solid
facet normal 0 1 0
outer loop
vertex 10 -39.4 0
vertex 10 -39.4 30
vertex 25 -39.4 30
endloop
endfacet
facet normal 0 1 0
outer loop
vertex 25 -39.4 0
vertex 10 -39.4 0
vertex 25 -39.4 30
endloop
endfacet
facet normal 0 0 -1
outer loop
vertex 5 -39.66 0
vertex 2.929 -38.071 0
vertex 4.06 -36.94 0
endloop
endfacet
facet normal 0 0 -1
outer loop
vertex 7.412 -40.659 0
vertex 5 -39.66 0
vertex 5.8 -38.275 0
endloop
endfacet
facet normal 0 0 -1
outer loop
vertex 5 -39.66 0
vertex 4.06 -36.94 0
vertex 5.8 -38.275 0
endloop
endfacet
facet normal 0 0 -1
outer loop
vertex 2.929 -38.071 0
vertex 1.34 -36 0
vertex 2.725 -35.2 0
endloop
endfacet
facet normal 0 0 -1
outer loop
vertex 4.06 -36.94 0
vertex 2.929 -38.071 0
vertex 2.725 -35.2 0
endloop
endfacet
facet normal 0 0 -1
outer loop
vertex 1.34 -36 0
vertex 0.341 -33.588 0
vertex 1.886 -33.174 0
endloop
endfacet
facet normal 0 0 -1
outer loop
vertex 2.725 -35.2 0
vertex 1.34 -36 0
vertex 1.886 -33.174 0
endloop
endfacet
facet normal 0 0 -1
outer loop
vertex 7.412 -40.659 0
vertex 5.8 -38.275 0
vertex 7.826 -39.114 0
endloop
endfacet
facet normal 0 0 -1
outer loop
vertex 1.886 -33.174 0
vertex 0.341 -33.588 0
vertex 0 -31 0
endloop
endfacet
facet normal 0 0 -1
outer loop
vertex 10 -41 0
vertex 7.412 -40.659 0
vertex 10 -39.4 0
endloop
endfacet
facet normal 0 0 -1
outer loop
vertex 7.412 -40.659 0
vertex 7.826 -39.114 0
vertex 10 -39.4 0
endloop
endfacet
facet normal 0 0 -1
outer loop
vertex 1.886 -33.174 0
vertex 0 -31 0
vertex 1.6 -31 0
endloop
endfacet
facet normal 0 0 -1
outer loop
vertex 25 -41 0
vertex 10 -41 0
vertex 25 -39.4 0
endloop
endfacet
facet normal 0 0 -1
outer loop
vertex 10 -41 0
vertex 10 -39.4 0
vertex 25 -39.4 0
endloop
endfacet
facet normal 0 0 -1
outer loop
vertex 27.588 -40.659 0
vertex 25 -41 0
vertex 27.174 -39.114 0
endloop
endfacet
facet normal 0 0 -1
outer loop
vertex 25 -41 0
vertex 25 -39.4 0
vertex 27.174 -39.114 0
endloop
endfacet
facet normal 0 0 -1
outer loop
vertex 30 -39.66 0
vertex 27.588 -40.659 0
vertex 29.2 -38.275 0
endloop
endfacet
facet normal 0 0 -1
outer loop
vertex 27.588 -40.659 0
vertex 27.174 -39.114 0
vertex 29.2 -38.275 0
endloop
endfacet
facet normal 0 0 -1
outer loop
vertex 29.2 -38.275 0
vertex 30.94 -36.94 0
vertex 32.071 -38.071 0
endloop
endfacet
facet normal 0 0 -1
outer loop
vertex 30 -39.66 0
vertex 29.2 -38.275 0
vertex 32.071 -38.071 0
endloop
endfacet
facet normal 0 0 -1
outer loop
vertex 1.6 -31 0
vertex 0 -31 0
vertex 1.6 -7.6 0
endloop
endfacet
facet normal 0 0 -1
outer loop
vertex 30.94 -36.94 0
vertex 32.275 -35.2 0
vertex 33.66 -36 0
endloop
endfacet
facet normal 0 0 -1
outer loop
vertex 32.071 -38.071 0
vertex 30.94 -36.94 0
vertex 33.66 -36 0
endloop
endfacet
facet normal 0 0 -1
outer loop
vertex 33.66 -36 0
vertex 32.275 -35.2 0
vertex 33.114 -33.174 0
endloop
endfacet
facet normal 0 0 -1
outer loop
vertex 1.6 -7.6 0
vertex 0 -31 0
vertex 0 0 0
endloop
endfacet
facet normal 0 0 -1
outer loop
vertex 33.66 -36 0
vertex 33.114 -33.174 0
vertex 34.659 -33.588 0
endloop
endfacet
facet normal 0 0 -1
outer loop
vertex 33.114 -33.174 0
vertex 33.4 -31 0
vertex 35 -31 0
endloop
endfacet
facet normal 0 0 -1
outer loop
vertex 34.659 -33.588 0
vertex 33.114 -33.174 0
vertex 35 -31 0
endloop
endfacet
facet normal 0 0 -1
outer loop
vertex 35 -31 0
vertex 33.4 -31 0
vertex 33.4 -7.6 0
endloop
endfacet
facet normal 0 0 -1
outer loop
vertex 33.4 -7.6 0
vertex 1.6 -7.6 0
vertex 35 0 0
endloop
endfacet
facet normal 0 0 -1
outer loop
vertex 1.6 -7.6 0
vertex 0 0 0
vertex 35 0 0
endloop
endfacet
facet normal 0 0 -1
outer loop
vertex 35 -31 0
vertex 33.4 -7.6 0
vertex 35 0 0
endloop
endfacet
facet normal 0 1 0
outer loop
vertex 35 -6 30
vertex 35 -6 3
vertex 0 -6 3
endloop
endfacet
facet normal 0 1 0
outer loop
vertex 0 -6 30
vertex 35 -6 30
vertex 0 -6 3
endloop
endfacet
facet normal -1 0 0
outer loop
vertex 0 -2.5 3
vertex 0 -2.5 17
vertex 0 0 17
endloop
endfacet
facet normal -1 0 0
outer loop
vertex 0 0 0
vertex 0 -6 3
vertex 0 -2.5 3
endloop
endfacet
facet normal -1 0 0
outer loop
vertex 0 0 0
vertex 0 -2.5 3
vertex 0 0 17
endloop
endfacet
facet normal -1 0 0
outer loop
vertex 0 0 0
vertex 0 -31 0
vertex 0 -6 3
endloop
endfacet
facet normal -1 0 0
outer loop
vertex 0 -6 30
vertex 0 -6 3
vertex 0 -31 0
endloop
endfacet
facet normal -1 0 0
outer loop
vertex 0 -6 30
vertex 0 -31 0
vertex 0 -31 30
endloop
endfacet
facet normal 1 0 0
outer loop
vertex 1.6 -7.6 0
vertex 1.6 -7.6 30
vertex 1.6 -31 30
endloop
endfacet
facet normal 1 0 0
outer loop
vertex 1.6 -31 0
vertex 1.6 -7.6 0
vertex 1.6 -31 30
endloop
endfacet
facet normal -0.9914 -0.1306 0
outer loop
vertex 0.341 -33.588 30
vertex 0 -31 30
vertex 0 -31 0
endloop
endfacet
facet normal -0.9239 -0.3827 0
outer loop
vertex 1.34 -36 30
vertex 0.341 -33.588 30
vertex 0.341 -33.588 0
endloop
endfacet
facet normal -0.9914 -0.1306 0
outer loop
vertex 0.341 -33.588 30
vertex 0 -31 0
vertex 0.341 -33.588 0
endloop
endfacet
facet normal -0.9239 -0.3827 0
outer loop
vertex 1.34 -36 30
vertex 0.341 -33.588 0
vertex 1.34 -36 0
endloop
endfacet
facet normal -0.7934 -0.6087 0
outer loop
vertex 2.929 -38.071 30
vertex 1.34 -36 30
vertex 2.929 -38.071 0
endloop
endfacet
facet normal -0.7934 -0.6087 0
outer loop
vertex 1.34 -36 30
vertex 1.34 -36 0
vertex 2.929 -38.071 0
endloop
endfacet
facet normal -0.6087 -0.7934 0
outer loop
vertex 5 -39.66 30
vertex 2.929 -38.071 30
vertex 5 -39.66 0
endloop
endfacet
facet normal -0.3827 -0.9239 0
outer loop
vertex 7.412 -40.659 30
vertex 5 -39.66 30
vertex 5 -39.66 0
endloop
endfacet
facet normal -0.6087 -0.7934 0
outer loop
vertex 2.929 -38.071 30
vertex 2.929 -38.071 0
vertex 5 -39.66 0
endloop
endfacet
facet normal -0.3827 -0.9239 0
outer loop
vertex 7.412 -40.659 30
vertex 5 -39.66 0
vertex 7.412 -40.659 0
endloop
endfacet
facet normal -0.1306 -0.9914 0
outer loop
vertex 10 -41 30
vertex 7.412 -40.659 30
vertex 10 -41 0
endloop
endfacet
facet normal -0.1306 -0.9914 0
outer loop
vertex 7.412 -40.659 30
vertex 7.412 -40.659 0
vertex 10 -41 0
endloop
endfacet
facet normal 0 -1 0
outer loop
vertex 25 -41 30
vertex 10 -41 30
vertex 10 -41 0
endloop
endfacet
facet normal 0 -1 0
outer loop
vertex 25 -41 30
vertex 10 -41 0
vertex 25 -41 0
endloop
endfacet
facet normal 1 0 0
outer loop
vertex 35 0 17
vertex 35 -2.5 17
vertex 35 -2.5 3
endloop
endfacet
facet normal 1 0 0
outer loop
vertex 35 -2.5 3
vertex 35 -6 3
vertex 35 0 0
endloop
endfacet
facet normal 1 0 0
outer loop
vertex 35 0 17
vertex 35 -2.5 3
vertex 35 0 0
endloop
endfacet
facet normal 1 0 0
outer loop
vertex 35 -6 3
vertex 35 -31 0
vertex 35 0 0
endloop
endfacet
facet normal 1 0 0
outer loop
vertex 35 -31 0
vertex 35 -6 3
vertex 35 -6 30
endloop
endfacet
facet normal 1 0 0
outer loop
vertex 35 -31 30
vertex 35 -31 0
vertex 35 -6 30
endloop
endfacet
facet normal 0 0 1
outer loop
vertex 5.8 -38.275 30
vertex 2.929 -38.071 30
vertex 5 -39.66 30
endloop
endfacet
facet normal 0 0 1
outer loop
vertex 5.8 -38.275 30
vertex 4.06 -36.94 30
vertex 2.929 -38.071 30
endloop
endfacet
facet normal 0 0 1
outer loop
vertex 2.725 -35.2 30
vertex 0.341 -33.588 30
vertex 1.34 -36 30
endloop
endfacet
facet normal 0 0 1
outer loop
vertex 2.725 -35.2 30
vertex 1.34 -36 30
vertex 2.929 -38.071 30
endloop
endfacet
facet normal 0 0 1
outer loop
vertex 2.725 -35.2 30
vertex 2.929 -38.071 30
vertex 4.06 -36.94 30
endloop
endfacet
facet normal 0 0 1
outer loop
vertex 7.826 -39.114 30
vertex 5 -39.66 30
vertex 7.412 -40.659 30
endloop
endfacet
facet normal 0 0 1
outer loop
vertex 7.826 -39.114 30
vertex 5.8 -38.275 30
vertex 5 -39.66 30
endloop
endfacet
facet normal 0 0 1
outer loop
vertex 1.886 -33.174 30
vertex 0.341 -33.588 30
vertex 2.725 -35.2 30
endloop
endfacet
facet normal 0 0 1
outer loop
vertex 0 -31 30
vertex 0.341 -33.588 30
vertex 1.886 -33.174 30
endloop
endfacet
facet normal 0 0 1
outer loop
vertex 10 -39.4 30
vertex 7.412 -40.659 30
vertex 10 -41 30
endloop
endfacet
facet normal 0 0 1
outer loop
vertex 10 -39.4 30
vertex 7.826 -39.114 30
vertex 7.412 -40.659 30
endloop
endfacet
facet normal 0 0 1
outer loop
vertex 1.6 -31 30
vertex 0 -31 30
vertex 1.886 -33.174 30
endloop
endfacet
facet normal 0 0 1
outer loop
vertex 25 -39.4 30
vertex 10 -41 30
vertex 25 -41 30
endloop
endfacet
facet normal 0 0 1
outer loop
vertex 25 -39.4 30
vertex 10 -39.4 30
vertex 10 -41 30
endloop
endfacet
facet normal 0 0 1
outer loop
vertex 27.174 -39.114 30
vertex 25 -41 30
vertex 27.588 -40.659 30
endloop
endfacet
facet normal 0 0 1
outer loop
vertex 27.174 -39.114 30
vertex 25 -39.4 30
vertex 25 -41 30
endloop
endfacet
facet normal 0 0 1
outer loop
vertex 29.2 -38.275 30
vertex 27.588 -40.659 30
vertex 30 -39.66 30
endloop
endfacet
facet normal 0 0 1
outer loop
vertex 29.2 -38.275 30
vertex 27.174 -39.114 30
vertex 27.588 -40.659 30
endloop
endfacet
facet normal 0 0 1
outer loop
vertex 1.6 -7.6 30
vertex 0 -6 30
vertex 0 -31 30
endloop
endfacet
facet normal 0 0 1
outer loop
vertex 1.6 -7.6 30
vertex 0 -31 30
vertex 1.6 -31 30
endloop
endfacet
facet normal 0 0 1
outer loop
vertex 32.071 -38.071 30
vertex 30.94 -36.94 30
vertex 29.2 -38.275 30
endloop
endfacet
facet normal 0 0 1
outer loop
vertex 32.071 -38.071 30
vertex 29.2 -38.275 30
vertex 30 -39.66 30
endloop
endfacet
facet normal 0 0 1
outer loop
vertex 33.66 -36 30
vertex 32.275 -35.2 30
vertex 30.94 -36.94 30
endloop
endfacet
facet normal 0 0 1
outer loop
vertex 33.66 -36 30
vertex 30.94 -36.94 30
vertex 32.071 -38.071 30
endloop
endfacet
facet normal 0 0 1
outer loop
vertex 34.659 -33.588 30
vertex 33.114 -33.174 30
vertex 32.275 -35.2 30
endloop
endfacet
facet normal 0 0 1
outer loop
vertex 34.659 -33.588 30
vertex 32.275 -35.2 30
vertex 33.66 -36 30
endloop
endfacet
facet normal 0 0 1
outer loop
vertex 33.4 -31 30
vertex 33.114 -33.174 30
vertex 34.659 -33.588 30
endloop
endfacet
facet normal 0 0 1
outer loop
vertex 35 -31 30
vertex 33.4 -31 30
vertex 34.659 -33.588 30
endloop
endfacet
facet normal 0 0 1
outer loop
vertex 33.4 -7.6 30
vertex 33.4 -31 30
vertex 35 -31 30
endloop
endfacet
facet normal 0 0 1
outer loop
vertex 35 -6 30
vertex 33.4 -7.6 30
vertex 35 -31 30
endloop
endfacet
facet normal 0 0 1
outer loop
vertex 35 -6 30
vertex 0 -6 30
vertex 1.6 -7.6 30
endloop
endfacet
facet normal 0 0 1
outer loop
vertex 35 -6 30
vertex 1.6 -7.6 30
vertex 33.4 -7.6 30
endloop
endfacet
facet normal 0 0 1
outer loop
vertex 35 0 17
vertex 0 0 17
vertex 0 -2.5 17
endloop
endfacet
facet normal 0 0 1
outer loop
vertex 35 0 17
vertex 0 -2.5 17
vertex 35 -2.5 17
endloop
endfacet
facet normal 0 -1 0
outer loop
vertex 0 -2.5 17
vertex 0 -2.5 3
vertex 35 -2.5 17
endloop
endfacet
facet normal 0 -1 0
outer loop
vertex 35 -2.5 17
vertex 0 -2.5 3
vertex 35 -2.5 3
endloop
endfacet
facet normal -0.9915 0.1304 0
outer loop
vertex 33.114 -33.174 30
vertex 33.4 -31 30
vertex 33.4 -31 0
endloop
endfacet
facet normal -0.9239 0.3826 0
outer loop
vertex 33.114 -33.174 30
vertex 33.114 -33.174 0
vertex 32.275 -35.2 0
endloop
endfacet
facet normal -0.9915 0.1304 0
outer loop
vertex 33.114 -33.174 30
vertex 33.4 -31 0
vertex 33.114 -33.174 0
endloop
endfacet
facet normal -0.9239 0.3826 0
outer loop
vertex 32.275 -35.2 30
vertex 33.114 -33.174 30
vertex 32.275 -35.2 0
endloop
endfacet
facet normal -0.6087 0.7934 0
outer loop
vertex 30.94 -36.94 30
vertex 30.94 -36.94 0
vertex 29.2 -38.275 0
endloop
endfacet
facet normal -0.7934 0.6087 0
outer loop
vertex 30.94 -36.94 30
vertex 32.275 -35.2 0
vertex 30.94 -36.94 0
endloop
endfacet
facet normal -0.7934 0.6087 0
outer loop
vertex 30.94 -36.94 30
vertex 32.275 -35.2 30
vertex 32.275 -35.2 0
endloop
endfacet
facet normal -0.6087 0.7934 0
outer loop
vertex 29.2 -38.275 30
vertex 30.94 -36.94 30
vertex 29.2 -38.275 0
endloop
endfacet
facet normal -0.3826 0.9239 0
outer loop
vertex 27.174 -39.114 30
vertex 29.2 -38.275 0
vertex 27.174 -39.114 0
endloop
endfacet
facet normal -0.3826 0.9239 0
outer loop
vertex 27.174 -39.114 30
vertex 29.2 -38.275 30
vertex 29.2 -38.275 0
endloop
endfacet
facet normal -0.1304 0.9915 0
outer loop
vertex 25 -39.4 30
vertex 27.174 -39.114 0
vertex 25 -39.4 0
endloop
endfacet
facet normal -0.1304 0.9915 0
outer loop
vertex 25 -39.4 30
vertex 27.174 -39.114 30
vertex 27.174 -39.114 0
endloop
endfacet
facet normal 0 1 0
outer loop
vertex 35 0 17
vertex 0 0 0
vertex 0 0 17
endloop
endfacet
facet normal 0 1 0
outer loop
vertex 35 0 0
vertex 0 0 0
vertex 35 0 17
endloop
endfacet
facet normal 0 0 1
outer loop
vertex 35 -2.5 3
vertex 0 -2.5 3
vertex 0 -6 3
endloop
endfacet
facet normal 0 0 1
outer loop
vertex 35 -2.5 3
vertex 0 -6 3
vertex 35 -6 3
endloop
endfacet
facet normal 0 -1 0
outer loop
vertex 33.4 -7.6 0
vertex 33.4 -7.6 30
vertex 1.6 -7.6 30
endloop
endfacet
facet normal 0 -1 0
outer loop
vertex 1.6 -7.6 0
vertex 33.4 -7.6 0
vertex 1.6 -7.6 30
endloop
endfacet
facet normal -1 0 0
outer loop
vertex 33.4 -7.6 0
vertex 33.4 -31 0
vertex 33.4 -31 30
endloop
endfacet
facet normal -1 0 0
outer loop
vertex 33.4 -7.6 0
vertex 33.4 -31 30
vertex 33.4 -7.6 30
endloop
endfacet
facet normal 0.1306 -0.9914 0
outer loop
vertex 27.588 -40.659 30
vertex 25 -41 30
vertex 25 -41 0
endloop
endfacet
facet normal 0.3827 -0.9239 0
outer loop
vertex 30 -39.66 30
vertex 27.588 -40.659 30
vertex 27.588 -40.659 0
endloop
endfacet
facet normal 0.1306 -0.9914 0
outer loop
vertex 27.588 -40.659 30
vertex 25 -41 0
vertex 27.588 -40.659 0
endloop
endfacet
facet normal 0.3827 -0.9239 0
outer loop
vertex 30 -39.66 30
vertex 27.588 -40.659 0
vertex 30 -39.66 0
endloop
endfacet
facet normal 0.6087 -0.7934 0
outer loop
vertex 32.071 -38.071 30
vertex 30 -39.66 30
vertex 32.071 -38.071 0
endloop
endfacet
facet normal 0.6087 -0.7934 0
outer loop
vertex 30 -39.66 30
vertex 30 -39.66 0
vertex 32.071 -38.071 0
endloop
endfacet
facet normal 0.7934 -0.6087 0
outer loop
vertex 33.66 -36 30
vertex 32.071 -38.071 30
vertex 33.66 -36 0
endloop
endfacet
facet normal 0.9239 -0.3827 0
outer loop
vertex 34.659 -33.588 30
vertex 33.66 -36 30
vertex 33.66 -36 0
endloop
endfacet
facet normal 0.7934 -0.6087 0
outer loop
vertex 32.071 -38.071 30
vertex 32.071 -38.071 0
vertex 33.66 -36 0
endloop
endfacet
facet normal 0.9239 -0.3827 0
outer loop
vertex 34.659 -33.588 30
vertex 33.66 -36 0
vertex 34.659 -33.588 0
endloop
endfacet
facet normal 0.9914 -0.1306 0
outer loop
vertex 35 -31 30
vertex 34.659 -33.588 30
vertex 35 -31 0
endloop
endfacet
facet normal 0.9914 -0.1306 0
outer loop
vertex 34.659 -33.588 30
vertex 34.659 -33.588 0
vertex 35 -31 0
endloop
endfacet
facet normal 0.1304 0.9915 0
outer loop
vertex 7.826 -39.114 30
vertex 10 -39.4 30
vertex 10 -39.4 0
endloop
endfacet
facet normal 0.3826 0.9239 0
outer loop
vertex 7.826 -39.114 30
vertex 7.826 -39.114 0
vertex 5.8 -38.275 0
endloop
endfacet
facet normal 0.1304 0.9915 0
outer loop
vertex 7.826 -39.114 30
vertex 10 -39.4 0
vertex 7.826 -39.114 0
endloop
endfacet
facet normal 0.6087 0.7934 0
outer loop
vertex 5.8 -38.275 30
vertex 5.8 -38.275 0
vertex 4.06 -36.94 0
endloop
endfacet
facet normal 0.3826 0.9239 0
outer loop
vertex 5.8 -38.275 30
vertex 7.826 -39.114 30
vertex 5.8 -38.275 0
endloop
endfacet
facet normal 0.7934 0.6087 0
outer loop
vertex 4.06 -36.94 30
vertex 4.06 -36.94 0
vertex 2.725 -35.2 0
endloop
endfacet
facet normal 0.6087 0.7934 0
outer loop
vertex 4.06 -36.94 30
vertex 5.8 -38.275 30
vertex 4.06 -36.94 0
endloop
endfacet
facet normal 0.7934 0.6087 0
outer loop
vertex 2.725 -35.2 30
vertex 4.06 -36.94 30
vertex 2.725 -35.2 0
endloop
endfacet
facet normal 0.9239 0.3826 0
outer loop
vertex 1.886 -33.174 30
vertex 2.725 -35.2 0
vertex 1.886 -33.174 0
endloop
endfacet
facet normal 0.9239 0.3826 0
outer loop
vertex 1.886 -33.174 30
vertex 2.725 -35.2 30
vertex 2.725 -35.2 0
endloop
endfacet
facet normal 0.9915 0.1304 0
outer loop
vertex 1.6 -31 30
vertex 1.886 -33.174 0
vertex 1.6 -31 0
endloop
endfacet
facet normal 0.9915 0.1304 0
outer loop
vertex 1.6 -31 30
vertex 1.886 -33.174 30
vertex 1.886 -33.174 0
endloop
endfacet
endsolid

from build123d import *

# Parameters (mm, degrees)
F1_DEPTH = 30
F2_T     = -1.6
F0_W     = 35
F0_H     = 3.5
F3_DEPTH = 3
F0_H_2   = 2.5
F4_DEPTH = 17
F5_DEPTH = 5


with BuildPart() as f1:
    # F0 (on Top) → F1 (new body)
    with BuildSketch(Plane.XY):
        with BuildLine():
            Line((35, -6), (0, -6))
            Line((0, -6), (0, -31))
            ThreePointArc((0, -31), (2.9289321881, -38.0710678119), (10, -41))
            Line((10, -41), (25, -41))
            ThreePointArc((25, -41), (32.0710678119, -38.0710678119), (35, -31))
            Line((35, -31), (35, -6))
        make_face()
    extrude(amount=F1_DEPTH)

    # F2
    f2_openings = [f1.faces().sort_by_distance(p)[0] for p in [
        (17.5, -22.945692, 30),
    ]]
    offset(amount=F2_T, openings=f2_openings)

    # F0 (on Top) → F3 (join)
    with BuildSketch(Plane.XY):
        with Locations((17.5, -4.25)):
            Rectangle(F0_W, F0_H)
    extrude(amount=F3_DEPTH)

    # F0 (on Top) → F4 (join)
    with BuildSketch(Plane.XY):
        with Locations((17.5, -1.25)):
            Rectangle(F0_W, F0_H_2)
    extrude(amount=F4_DEPTH)

    # F5 (cut): a face of the model
    f5_faces = [f1.faces().sort_by_distance(p)[0] for p in [
        (17.5, -23.0670520916, 1.6),
    ]]
    extrude(f5_faces, amount=-F5_DEPTH, mode=Mode.SUBTRACT)


solid = f1.part
